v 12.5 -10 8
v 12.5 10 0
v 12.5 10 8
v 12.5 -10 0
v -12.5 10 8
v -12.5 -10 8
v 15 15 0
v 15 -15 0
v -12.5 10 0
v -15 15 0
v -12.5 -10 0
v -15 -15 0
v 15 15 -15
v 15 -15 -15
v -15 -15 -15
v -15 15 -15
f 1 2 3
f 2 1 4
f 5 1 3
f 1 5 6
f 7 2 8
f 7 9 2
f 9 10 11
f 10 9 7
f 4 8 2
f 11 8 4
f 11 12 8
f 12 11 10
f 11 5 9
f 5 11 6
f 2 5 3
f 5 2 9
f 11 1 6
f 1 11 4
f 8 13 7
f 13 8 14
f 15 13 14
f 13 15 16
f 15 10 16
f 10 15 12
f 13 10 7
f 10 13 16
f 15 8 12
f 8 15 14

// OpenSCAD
$fn=100; 

tolerance = 0.3;
module rectangular_hole(int_w=25, int_l=20, ext_w=30, ext_l=30){
    shaft_height = 8;
    translate([0, 0, shaft_height/2]){
        cube([int_w, int_l, shaft_height], center=true);
    }
    
    body_height = 15;
    translate([0, 0, -body_height/2]){
        cube([ext_w, ext_l, body_height], center=true);
    }      
}

rectangular_hole();
